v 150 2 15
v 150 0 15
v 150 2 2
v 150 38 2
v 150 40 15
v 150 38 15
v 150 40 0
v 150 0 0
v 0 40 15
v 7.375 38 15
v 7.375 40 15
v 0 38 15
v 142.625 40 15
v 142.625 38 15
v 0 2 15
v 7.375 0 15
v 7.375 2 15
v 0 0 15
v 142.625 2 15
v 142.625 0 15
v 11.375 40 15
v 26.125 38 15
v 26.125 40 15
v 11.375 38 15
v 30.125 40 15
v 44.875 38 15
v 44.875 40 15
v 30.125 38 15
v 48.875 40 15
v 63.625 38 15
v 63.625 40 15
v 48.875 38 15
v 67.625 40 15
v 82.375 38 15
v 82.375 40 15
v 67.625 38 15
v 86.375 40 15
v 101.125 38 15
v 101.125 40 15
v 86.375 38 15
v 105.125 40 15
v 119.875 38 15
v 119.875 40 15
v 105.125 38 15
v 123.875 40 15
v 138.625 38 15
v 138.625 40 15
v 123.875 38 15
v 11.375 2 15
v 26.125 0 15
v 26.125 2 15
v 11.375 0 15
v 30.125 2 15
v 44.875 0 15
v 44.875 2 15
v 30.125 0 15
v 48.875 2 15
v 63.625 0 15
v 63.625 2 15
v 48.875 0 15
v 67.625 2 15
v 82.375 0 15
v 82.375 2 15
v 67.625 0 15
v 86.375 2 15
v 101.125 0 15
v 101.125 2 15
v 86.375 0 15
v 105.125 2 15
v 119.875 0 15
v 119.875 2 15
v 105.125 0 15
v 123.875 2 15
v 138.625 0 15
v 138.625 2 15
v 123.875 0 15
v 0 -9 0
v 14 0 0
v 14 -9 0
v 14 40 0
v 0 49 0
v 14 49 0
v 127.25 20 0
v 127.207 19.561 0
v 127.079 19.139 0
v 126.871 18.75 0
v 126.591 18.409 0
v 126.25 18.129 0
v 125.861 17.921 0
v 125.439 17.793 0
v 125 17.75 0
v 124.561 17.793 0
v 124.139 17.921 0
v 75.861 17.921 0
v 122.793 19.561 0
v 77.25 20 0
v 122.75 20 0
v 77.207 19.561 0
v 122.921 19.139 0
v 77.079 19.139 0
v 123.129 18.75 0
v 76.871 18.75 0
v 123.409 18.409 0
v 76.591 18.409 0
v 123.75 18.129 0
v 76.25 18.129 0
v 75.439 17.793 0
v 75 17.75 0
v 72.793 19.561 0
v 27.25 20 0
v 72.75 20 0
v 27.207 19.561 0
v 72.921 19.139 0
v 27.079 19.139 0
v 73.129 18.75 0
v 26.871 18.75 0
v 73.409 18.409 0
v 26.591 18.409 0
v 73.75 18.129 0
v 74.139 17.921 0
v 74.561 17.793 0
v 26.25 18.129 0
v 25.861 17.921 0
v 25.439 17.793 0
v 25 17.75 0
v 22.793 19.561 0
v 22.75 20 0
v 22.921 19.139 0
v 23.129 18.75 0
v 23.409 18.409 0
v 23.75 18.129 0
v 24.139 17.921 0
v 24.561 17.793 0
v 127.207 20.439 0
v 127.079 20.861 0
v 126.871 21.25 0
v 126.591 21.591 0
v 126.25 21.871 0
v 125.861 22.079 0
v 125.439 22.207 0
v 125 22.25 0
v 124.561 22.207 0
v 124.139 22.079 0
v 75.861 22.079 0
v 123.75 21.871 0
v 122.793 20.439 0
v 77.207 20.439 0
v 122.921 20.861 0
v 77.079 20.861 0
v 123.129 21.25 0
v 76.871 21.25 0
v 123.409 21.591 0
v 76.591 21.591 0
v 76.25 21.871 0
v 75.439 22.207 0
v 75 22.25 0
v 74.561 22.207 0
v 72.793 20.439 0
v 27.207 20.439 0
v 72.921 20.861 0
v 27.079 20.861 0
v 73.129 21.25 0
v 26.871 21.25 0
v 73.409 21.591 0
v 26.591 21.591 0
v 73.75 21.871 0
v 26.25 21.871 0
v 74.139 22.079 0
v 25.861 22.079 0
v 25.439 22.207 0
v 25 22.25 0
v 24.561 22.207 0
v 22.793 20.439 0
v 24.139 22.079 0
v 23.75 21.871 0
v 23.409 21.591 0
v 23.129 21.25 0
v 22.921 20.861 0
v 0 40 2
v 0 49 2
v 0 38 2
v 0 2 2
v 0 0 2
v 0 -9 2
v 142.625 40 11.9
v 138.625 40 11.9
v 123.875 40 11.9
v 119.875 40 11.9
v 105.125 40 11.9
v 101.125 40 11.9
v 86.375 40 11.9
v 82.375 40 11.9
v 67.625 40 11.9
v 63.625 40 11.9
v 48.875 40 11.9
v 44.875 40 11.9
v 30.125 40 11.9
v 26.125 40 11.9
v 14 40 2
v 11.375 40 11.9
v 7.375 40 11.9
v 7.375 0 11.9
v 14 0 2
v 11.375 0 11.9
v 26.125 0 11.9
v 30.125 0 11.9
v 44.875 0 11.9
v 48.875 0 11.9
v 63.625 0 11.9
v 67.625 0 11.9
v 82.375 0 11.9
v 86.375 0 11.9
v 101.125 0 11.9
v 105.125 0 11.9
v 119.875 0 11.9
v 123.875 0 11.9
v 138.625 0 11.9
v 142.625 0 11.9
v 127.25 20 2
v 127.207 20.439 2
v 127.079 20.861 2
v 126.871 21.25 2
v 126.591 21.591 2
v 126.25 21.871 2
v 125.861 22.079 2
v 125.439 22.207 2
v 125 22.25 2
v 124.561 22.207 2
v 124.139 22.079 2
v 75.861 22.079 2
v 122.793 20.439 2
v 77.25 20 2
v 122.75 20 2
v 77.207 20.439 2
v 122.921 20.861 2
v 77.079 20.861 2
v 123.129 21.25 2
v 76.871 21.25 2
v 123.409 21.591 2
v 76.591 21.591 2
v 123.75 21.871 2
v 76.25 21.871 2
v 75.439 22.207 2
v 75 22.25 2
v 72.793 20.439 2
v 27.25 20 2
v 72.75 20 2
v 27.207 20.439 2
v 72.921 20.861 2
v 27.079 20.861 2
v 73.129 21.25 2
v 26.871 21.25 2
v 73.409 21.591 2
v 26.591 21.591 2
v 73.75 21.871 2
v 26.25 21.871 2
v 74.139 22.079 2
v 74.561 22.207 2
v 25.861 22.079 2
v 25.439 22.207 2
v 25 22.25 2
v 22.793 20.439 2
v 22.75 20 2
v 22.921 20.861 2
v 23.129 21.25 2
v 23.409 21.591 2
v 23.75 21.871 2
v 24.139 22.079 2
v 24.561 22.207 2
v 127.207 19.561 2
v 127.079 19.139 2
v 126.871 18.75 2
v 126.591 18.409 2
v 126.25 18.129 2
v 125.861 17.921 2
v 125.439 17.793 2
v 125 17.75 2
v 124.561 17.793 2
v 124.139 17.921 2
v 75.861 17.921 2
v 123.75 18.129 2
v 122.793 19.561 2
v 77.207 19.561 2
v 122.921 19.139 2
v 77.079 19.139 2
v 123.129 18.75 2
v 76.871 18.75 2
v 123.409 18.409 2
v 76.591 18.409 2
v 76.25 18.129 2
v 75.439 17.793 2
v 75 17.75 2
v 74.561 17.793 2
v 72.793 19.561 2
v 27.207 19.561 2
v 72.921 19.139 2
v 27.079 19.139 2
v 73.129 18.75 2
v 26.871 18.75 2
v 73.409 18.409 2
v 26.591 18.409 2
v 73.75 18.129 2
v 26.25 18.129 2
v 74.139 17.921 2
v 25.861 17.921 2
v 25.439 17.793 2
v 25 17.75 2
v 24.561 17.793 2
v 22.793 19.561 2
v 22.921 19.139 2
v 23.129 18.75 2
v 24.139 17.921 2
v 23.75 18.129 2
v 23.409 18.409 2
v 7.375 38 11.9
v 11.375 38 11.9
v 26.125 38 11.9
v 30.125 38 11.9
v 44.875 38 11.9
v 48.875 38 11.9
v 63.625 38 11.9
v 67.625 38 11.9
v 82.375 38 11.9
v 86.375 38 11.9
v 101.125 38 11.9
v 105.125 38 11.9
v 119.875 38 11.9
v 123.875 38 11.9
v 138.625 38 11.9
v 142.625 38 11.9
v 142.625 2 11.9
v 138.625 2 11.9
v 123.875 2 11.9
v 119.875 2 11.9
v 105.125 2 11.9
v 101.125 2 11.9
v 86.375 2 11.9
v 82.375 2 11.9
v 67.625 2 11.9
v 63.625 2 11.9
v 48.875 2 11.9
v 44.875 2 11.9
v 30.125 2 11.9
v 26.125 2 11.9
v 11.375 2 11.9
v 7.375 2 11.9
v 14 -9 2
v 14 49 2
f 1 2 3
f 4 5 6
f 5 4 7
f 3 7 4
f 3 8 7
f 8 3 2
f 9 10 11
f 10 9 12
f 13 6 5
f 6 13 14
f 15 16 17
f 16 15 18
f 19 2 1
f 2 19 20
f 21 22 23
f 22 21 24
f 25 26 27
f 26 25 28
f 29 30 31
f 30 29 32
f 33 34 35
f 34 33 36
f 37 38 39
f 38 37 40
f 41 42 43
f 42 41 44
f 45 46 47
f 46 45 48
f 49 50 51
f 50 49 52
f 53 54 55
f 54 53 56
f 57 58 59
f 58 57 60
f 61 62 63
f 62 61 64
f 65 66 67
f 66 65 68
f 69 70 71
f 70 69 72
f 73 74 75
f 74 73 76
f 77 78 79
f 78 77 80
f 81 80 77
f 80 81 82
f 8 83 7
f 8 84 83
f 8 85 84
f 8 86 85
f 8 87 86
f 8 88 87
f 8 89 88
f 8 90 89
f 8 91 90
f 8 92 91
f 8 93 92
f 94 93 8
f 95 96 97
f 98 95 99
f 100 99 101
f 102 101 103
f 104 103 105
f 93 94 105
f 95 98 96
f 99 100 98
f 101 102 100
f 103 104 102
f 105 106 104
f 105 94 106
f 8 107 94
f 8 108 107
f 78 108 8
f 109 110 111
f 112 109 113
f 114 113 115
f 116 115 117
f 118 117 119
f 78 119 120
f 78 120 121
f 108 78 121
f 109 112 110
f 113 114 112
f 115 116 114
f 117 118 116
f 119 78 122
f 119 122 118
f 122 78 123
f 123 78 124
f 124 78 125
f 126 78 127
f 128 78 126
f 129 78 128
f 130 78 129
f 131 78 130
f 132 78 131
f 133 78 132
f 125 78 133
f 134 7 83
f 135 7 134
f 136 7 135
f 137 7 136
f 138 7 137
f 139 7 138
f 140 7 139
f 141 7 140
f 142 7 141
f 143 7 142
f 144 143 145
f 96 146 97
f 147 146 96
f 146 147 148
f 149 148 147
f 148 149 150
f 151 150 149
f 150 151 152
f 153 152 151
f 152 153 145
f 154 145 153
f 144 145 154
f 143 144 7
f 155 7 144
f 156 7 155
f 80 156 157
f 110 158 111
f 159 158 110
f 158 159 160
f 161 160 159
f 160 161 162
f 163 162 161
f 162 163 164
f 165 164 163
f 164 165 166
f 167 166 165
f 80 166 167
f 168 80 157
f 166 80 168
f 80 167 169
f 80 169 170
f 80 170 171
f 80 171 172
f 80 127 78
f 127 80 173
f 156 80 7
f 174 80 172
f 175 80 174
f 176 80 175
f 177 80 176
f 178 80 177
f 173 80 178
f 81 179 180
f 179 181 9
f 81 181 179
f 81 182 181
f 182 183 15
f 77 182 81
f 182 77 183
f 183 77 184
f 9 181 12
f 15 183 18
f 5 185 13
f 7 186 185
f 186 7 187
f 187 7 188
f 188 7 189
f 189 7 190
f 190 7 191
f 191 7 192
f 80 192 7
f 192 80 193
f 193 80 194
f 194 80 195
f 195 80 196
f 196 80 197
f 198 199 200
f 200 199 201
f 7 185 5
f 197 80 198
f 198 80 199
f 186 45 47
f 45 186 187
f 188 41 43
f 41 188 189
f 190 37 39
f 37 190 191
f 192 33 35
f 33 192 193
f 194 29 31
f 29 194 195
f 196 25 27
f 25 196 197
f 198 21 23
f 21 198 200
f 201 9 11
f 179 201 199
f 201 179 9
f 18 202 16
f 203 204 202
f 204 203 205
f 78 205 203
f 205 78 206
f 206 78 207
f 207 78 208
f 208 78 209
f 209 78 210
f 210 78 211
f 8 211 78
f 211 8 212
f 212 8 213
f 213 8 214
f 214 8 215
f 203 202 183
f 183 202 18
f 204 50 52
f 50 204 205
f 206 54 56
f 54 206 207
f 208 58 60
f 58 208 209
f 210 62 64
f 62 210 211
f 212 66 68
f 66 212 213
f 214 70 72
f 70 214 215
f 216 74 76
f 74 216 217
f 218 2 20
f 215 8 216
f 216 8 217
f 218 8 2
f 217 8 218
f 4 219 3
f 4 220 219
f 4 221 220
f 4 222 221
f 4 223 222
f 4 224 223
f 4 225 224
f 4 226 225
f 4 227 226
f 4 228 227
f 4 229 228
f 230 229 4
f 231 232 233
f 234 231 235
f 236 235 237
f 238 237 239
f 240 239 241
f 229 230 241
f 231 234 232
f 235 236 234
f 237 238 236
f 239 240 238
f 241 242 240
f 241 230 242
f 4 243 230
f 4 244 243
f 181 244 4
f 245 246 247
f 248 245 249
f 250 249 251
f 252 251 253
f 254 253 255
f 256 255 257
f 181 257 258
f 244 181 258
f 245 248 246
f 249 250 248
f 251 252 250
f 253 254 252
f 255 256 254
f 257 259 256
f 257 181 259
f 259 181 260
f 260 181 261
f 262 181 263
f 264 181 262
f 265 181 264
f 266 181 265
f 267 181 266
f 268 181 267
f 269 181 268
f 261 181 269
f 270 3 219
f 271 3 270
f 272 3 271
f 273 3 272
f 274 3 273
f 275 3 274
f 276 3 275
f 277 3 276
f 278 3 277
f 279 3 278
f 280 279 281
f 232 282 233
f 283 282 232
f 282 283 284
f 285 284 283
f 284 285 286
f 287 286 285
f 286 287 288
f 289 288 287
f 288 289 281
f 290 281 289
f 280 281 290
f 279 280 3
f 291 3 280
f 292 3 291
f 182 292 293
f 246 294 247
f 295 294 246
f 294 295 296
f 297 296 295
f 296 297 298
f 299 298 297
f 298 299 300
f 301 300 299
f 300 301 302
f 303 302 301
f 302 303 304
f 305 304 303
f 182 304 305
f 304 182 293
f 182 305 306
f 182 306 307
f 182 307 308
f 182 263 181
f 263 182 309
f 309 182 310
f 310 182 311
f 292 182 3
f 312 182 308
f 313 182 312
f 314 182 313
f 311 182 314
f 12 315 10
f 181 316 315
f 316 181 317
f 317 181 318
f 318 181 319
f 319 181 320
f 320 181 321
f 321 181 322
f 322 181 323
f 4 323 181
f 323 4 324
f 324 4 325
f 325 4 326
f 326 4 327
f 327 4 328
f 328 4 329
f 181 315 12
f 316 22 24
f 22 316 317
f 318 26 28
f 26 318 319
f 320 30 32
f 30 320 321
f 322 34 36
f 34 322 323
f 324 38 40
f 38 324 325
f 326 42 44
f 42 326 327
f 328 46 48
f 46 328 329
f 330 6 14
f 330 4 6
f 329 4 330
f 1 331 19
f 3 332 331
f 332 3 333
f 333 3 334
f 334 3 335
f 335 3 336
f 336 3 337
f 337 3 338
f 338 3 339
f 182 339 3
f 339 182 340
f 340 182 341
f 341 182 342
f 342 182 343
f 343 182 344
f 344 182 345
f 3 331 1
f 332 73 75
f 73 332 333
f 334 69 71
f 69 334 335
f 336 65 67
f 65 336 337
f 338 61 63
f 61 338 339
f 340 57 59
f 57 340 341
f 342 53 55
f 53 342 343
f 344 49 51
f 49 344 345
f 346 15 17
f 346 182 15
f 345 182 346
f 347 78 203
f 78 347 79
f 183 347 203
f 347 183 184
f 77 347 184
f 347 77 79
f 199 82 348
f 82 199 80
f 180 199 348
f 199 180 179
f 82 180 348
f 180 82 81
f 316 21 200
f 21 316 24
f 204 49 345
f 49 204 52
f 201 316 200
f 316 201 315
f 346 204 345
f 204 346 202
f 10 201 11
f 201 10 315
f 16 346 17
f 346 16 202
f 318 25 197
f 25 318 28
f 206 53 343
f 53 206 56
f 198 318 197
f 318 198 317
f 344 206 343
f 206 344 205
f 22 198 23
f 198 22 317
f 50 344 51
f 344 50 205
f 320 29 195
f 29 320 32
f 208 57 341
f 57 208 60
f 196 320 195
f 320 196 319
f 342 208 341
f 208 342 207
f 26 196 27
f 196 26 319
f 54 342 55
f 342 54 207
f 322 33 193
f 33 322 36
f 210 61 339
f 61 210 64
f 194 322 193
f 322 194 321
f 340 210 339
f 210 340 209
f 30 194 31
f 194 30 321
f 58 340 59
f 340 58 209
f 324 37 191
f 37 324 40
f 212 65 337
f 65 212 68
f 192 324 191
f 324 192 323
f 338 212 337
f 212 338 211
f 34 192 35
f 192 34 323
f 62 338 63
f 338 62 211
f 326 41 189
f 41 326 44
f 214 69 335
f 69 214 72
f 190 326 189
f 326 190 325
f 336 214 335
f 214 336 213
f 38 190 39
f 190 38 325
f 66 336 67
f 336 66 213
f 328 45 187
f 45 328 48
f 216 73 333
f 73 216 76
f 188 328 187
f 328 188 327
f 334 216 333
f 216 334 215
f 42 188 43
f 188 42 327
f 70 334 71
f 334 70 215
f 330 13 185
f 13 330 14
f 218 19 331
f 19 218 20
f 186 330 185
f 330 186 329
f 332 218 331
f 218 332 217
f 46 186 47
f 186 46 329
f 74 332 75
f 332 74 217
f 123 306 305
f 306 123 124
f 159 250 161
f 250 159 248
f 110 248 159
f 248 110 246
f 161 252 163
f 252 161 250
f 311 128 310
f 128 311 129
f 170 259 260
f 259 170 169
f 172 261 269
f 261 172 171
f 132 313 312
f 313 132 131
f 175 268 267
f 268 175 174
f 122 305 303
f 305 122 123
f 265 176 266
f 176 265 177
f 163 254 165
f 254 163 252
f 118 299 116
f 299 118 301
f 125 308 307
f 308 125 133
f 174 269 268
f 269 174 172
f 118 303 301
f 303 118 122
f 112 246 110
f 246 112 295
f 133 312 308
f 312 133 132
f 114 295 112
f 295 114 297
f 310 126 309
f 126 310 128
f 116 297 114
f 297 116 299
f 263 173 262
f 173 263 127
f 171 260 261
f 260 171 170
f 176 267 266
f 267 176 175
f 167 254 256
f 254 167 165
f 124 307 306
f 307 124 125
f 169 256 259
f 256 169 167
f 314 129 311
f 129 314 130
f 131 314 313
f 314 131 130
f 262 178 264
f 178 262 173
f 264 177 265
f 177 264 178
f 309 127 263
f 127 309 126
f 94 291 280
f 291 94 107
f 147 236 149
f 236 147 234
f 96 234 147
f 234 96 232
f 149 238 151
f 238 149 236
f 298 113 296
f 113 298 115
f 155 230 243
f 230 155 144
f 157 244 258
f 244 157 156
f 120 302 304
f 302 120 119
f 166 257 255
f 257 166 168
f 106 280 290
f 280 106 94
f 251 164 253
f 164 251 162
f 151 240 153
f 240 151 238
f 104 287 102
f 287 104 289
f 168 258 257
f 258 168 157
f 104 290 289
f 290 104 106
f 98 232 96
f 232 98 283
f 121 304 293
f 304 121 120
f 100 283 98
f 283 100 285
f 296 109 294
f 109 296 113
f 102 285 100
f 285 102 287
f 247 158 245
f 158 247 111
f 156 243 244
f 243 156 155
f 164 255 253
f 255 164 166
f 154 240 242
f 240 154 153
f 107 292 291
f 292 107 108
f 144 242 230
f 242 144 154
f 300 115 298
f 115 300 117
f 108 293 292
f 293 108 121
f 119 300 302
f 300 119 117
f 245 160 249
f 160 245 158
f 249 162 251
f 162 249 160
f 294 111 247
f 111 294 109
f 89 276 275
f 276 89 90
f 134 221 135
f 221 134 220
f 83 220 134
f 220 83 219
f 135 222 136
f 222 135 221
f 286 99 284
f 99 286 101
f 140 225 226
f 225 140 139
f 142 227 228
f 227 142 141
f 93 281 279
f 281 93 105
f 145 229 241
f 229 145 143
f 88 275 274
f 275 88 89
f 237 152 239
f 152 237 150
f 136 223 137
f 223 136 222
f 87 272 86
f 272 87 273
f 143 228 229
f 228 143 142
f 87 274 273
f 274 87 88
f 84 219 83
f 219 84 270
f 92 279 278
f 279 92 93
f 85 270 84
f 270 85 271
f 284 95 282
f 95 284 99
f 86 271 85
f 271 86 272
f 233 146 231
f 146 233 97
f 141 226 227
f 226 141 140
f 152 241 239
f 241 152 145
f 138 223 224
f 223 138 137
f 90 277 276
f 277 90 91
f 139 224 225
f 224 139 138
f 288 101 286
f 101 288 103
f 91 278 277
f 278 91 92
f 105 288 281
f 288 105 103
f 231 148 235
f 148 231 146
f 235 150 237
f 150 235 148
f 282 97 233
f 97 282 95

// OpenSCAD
$fn = 32;

// ----------------------------------------------------------------------
// Cable duct: 150 x 40 x 15 mm, 8 fingers
// ----------------------------------------------------------------------

// --- parameters (mm) ---
channel_l = 150;          // duct length, X
channel_w = 40;           // duct width, Y
channel_h = 15;           // duct height, Z
channel_t = 2;            // side wall thickness
floor_t = 2;              // floor thickness
slot_w = 4;               // finger slot width
slot_h = 9.9;             // finger slot height
fingers = 8;              // number of finger slots per side
pitch = 18.75;            // finger pitch
hole_d = 4.5;             // floor mounting hole
hole_n = 3;               // mounting holes in the floor
ear_w = 10;               // mounting ear width
ear_l = 14;               // mounting ear length

module shell() {
  difference() {
    cube([channel_l, channel_w, channel_h]);
    /* open top channel */
    translate([-channel_t - 1, channel_t, floor_t])
      cube([channel_l + 2 * channel_t + 2, channel_w - 2 * channel_t, channel_h + 1]);
  }
}

module ears() {
  translate([0, -ear_w + 1, 0]) cube([ear_l, ear_w, floor_t]);
  translate([0, channel_w - 1, 0]) cube([ear_l, ear_w, floor_t]);
}

difference() {
  union() {
    shell();
    ears();
  }
  /* finger slots cut through both side walls */
  for (i = [0 : fingers - 1]) translate([pitch / 2 + i * pitch - slot_w / 2, -1, floor_t + slot_h]) cube([slot_w, channel_w + 2, channel_h]);
  for (i = [0 : hole_n - 1]) translate([(channel_l / hole_n) * (i + 0.5), channel_w / 2, -1]) cylinder(h = floor_t + 2, d = hole_d);
}
